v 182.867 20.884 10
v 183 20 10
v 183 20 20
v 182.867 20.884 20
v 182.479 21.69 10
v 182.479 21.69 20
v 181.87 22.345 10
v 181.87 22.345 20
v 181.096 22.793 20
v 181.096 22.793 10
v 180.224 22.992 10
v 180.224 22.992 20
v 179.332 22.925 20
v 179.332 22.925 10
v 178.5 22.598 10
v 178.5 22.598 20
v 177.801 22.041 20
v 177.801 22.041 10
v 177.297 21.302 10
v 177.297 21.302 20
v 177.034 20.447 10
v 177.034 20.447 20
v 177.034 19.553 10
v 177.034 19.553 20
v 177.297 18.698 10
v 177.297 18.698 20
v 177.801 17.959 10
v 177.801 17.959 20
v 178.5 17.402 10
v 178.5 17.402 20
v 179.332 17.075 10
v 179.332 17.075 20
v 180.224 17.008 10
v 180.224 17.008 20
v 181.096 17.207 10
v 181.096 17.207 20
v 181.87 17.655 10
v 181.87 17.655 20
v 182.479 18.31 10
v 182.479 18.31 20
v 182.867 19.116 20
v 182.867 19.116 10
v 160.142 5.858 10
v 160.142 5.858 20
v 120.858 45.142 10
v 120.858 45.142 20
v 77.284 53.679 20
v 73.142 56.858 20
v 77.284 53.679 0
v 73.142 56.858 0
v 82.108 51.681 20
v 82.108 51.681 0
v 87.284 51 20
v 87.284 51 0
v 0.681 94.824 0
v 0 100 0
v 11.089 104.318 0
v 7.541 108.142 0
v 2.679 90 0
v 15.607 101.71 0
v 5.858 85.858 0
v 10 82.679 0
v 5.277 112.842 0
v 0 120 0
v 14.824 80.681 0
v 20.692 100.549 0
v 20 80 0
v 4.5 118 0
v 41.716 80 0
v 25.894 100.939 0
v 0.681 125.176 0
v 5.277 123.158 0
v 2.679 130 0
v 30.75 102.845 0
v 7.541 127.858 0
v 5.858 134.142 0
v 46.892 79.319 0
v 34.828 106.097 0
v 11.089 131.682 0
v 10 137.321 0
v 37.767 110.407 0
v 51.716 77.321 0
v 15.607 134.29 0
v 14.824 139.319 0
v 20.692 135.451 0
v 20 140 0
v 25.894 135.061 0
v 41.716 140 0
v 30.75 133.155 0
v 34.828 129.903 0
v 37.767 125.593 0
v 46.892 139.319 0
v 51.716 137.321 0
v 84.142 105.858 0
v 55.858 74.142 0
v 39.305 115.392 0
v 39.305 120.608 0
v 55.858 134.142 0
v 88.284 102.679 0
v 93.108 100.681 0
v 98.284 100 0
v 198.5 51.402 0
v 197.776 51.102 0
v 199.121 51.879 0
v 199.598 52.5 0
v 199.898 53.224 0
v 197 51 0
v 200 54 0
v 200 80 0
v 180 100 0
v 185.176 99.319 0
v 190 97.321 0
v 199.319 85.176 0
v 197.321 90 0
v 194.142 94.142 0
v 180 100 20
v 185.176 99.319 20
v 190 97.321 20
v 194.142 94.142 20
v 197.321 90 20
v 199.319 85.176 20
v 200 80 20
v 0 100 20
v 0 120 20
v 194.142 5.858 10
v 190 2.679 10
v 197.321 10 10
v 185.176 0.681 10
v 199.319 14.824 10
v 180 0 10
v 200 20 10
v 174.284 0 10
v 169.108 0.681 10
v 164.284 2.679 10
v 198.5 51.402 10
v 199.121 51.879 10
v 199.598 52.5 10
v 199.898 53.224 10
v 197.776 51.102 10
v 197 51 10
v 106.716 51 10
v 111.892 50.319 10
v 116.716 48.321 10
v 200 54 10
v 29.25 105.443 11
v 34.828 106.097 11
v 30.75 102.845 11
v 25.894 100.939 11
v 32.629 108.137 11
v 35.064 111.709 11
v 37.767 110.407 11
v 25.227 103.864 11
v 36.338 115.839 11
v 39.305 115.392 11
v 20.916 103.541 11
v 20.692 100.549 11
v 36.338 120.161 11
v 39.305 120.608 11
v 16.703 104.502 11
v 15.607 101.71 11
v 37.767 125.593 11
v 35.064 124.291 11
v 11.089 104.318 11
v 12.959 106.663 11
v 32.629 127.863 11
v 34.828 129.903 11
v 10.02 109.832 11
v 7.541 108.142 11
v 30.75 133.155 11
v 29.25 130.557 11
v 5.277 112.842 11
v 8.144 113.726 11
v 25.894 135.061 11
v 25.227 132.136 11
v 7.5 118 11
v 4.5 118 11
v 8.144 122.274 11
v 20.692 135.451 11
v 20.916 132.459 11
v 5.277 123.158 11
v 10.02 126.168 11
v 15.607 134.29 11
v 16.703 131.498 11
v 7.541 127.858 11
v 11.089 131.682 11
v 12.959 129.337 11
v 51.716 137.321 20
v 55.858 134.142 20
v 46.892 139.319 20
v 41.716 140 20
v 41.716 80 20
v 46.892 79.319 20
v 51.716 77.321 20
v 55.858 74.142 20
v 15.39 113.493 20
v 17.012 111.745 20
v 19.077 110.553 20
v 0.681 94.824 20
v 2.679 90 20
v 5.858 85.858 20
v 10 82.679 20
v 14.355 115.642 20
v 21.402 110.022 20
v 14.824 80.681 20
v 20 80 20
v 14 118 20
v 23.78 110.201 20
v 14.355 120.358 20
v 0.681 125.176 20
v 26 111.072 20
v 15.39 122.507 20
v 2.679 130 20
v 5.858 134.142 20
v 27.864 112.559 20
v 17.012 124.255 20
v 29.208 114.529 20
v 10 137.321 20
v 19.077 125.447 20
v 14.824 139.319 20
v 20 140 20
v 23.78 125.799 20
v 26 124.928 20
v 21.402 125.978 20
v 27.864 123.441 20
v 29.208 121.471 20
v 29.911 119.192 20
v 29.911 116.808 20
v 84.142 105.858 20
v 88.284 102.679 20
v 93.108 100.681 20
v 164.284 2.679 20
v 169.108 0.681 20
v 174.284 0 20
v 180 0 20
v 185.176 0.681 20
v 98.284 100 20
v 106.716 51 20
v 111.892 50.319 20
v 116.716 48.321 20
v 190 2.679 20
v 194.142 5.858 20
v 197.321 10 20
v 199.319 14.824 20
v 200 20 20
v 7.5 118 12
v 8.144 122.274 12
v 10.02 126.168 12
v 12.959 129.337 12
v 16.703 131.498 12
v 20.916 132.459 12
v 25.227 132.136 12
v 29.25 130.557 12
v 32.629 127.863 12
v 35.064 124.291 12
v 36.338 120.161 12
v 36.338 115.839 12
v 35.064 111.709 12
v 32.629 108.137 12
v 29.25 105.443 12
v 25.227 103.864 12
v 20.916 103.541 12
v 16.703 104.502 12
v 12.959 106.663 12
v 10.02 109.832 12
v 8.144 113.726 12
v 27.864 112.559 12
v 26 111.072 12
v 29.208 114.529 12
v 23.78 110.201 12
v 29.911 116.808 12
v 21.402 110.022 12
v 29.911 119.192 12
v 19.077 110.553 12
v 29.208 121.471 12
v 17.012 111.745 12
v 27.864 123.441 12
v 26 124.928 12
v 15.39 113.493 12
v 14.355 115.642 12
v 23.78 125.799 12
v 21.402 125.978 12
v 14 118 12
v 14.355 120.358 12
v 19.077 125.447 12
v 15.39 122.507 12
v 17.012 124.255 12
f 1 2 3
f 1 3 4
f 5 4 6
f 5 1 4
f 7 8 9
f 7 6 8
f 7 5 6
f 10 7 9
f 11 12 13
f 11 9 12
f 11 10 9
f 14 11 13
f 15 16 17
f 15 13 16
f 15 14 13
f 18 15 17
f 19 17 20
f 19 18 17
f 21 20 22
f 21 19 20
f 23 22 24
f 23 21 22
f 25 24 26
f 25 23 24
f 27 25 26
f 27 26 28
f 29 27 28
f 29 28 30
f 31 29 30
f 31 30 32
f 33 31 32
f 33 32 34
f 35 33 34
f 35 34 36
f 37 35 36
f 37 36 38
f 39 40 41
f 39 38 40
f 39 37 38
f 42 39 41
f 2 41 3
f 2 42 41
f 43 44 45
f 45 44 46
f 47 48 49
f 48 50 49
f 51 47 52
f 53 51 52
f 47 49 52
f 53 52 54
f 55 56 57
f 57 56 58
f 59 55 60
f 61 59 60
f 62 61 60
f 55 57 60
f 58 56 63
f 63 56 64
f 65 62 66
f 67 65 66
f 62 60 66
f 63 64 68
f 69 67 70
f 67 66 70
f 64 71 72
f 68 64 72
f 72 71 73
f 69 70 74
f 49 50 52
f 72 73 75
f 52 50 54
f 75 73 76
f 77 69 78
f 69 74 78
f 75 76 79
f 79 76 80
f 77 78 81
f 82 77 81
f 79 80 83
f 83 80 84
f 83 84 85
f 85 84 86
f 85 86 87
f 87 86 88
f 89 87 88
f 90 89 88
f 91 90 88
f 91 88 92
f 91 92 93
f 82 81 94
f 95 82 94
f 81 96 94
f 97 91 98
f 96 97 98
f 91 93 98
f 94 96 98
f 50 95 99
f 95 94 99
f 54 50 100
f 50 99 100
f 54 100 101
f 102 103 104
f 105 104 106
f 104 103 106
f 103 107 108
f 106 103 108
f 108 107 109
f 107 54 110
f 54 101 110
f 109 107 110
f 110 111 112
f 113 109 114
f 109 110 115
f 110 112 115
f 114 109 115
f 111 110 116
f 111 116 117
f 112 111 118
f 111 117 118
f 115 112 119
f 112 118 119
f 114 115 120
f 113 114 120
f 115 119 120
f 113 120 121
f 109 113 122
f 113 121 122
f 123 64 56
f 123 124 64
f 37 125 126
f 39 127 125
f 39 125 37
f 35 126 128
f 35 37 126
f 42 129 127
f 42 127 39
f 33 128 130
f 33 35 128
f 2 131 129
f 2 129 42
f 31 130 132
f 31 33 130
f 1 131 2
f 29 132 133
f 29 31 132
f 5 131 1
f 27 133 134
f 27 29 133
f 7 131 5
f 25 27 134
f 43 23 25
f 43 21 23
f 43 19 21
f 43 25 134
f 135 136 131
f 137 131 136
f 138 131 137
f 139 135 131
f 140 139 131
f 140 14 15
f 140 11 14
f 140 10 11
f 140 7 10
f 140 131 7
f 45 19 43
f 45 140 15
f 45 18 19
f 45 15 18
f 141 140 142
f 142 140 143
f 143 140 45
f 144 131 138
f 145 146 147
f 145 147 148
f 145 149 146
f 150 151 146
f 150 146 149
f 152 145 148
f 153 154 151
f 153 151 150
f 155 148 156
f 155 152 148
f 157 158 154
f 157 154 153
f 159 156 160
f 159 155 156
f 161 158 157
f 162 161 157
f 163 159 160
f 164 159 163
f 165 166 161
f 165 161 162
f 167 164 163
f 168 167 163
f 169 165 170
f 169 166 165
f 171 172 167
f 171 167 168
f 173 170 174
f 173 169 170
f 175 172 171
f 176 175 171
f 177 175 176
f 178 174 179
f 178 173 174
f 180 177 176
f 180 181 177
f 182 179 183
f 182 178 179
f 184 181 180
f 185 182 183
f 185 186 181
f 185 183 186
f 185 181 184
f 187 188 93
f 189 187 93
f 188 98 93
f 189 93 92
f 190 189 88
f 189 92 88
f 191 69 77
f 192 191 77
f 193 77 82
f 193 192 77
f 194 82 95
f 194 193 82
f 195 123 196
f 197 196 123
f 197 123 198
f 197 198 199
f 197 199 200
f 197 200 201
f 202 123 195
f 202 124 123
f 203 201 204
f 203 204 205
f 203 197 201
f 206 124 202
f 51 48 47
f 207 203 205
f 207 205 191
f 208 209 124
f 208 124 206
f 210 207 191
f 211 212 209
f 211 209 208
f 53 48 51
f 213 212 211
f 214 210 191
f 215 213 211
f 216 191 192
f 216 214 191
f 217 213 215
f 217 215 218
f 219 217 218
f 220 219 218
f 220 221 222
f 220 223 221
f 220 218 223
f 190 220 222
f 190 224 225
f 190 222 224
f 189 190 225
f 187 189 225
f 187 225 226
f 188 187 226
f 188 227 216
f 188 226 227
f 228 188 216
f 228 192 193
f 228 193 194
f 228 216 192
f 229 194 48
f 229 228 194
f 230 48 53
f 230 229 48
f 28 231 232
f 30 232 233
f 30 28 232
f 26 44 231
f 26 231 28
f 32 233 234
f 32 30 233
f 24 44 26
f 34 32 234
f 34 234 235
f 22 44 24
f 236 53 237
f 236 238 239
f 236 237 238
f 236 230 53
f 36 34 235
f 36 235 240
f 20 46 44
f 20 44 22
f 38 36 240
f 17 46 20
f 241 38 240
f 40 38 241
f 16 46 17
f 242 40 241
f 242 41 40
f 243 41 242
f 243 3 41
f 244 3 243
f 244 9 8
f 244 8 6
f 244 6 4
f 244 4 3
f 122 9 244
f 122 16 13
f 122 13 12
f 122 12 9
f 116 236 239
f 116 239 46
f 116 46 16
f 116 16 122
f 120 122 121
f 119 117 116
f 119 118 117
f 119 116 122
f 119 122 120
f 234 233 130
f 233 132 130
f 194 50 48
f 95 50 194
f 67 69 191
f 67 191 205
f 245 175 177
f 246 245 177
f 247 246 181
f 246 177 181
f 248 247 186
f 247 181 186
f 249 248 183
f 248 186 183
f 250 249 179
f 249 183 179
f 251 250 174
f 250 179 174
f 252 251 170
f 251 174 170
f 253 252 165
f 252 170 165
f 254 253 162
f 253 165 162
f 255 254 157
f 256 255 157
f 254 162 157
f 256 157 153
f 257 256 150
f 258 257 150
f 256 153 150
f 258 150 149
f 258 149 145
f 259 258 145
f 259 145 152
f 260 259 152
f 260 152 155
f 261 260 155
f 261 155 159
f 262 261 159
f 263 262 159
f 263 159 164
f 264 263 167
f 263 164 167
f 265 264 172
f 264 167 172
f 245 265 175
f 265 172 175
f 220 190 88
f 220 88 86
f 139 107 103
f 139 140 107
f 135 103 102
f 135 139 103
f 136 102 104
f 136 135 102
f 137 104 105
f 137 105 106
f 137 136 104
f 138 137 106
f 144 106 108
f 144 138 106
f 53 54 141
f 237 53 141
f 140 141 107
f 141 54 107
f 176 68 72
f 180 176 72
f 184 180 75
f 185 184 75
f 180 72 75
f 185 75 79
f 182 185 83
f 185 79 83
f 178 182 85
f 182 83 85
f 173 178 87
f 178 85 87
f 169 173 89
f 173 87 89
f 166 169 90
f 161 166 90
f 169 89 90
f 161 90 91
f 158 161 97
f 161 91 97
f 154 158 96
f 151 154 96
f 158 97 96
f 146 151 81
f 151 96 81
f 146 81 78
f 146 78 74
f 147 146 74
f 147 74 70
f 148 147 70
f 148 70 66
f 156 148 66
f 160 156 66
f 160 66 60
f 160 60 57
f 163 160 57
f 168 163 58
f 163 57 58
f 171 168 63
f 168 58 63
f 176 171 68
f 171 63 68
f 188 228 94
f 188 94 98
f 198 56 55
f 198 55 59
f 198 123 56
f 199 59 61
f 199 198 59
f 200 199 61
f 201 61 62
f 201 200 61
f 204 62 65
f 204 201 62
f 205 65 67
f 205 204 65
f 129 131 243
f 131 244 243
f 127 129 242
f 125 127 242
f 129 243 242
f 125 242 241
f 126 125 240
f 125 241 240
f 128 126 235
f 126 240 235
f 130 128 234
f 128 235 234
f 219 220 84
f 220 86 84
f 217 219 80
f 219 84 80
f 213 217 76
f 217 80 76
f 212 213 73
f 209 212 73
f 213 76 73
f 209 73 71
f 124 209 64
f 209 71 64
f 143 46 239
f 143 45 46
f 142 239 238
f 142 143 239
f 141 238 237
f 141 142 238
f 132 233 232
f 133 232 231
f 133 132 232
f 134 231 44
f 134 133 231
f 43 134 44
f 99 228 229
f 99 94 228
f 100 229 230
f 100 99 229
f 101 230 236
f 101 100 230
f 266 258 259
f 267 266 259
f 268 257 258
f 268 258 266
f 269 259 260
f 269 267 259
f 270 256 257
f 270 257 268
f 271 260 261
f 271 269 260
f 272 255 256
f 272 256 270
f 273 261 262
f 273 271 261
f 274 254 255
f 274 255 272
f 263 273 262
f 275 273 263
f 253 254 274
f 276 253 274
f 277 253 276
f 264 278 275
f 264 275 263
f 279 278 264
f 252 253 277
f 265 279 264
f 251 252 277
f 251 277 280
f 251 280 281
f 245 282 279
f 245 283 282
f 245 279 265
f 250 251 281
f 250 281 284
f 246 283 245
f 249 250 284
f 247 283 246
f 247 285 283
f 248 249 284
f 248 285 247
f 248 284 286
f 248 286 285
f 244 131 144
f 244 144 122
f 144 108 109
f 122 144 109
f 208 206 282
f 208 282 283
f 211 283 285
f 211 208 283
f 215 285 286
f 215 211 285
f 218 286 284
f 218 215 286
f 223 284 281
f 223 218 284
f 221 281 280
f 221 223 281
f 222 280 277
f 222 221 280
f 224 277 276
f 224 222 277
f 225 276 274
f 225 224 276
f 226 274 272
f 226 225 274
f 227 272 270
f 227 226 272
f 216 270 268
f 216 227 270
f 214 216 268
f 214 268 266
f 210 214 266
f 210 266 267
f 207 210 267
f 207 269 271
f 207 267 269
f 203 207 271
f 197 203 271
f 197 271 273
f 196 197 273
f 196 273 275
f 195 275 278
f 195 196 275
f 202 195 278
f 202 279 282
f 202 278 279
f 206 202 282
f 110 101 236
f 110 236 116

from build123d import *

# Parameters (mm, degrees)
ESQUISSE1_W                  = 200
ESQUISSE1_H                  = 100
BOSS_EXTRU_1_DEPTH           = 20
ENL_V_MAT_EXTRU_1_DEPTH      = 225.499443206
ENL_V_MAT_EXTRU_1_DEPTH_BACK = 225.499443206
ESQUISSE2_R                  = 3
ENL_V_MAT_EXTRU_2_DEPTH      = 225.499443206
ENL_V_MAT_EXTRU_2_DEPTH_BACK = 225.499443206
ENL_V_MAT_EXTRU_3_DEPTH      = 10
ENL_V_MAT_EXTRU_4_DEPTH      = 224.830292856
ENL_V_MAT_EXTRU_4_DEPTH_BACK = 224.830292856
BOSS_EXTRU_2_DEPTH           = 20
ESQUISSE7_R                  = 17.5
ENL_V_MAT_EXTRU_5_DEPTH      = 11
ENL_V_MAT_EXTRU_6_DEPTH      = 245.378804318
ENL_V_MAT_EXTRU_6_DEPTH_BACK = 245.378804318
ESQUISSE8_R                  = 8
ESQUISSE9_R                  = 14.5
ENL_V_MAT_EXTRU_7_DEPTH      = 1
CONG_1_R                     = 20
CONG_2_R                     = 3


with BuildPart() as part:
    # Esquisse1 → Boss.-Extru.1 (new body)
    with BuildSketch(Plane.XY):
        with Locations((100, 50)):
            Rectangle(ESQUISSE1_W, ESQUISSE1_H)
    extrude(amount=BOSS_EXTRU_1_DEPTH)

    # Esquisse2 → Enlèv. mat.-Extru.1 (cut, two sides: drawn at the far end of the back side and taken through both)
    with BuildSketch(Plane.XY.offset(20).offset(-ENL_V_MAT_EXTRU_1_DEPTH_BACK)):
        with Locations((180, 20)):
            Circle(ESQUISSE2_R)
    extrude(amount=ENL_V_MAT_EXTRU_1_DEPTH + ENL_V_MAT_EXTRU_1_DEPTH_BACK, mode=Mode.SUBTRACT)

    # Esquisse3 → Enlèv. mat.-Extru.2 (cut, two sides: drawn at the far end of the back side and taken through both)
    with BuildSketch(Plane.XY.offset(20).offset(-ENL_V_MAT_EXTRU_2_DEPTH_BACK)):
        Polygon((130, 0), (50, 80), (0, 80), (0, 0), align=None)
    extrude(amount=ENL_V_MAT_EXTRU_2_DEPTH + ENL_V_MAT_EXTRU_2_DEPTH_BACK, mode=Mode.SUBTRACT)

    # Esquisse4 → Enlèv. mat.-Extru.3 (cut)
    with BuildSketch(Plane(origin=(0, 0, 0), x_dir=(-1, 0, 0), z_dir=(0, 0, -1))):
        Polygon((-130, 0), (-79, 51), (-200, 51), (-200, 0), align=None)
    extrude(amount=-ENL_V_MAT_EXTRU_3_DEPTH, mode=Mode.SUBTRACT)

    # Esquisse5 → Enlèv. mat.-Extru.4 (cut, two sides: drawn at the far end of the back side and taken through both)
    with BuildSketch(Plane(origin=(0, 0, 10), x_dir=(-1, 0, 0), z_dir=(0, 0, -1)).offset(-ENL_V_MAT_EXTRU_4_DEPTH_BACK)):
        Polygon((-130, 0), (-166, 0), (-115, 51), (-79, 51), align=None)
    extrude(amount=ENL_V_MAT_EXTRU_4_DEPTH + ENL_V_MAT_EXTRU_4_DEPTH_BACK, mode=Mode.SUBTRACT)

    # Esquisse6 → Boss.-Extru.2 (add)
    with BuildSketch(Plane.XY.offset(20)):
        Polygon((0, 100), (90, 100), (50, 140), (0, 140), align=None)
    extrude(amount=-BOSS_EXTRU_2_DEPTH)

    # Esquisse7 → Enlèv. mat.-Extru.5 (cut)
    with BuildSketch(Plane(origin=(0, 0, 0), x_dir=(-1, 0, 0), z_dir=(0, 0, -1))):
        with Locations((-22, 118)):
            Circle(ESQUISSE7_R)
    extrude(amount=-ENL_V_MAT_EXTRU_5_DEPTH, mode=Mode.SUBTRACT)

    # Esquisse8 → Enlèv. mat.-Extru.6 (cut, two sides: drawn at the far end of the back side and taken through both)
    with BuildSketch(Plane(origin=(0, 0, 11), x_dir=(-1, 0, 0), z_dir=(0, 0, -1)).offset(-ENL_V_MAT_EXTRU_6_DEPTH_BACK)):
        with Locations((-22, 118)):
            Circle(ESQUISSE8_R)
    extrude(amount=ENL_V_MAT_EXTRU_6_DEPTH + ENL_V_MAT_EXTRU_6_DEPTH_BACK, mode=Mode.SUBTRACT)

    # Esquisse9 → Enlèv. mat.-Extru.7 (cut)
    with BuildSketch(Plane(origin=(0, 0, 11), x_dir=(-1, 0, 0), z_dir=(0, 0, -1))):
        with Locations((-22, 118)):
            Circle(ESQUISSE9_R)
    extrude(amount=-ENL_V_MAT_EXTRU_7_DEPTH, mode=Mode.SUBTRACT)

    # Congé1
    cong_1_edges = [part.edges().sort_by_distance(p)[0] for p in [
        (0, 80, 10),
        (50, 80, 10),
        (79, 51, 10),
        (115, 51, 15),
        (166, 0, 15),
        (200, 100, 10),
        (0, 140, 10),
        (200, 0, 15),
        (50, 140, 10),
        (90, 100, 10),
    ]]
    fillet(cong_1_edges, radius=CONG_1_R)

    # Congé2
    cong_2_edges = [part.edges().sort_by_distance(p)[0] for p in [
        (200, 51, 5),
    ]]
    fillet(cong_2_edges, radius=CONG_2_R)


solid = part.part
